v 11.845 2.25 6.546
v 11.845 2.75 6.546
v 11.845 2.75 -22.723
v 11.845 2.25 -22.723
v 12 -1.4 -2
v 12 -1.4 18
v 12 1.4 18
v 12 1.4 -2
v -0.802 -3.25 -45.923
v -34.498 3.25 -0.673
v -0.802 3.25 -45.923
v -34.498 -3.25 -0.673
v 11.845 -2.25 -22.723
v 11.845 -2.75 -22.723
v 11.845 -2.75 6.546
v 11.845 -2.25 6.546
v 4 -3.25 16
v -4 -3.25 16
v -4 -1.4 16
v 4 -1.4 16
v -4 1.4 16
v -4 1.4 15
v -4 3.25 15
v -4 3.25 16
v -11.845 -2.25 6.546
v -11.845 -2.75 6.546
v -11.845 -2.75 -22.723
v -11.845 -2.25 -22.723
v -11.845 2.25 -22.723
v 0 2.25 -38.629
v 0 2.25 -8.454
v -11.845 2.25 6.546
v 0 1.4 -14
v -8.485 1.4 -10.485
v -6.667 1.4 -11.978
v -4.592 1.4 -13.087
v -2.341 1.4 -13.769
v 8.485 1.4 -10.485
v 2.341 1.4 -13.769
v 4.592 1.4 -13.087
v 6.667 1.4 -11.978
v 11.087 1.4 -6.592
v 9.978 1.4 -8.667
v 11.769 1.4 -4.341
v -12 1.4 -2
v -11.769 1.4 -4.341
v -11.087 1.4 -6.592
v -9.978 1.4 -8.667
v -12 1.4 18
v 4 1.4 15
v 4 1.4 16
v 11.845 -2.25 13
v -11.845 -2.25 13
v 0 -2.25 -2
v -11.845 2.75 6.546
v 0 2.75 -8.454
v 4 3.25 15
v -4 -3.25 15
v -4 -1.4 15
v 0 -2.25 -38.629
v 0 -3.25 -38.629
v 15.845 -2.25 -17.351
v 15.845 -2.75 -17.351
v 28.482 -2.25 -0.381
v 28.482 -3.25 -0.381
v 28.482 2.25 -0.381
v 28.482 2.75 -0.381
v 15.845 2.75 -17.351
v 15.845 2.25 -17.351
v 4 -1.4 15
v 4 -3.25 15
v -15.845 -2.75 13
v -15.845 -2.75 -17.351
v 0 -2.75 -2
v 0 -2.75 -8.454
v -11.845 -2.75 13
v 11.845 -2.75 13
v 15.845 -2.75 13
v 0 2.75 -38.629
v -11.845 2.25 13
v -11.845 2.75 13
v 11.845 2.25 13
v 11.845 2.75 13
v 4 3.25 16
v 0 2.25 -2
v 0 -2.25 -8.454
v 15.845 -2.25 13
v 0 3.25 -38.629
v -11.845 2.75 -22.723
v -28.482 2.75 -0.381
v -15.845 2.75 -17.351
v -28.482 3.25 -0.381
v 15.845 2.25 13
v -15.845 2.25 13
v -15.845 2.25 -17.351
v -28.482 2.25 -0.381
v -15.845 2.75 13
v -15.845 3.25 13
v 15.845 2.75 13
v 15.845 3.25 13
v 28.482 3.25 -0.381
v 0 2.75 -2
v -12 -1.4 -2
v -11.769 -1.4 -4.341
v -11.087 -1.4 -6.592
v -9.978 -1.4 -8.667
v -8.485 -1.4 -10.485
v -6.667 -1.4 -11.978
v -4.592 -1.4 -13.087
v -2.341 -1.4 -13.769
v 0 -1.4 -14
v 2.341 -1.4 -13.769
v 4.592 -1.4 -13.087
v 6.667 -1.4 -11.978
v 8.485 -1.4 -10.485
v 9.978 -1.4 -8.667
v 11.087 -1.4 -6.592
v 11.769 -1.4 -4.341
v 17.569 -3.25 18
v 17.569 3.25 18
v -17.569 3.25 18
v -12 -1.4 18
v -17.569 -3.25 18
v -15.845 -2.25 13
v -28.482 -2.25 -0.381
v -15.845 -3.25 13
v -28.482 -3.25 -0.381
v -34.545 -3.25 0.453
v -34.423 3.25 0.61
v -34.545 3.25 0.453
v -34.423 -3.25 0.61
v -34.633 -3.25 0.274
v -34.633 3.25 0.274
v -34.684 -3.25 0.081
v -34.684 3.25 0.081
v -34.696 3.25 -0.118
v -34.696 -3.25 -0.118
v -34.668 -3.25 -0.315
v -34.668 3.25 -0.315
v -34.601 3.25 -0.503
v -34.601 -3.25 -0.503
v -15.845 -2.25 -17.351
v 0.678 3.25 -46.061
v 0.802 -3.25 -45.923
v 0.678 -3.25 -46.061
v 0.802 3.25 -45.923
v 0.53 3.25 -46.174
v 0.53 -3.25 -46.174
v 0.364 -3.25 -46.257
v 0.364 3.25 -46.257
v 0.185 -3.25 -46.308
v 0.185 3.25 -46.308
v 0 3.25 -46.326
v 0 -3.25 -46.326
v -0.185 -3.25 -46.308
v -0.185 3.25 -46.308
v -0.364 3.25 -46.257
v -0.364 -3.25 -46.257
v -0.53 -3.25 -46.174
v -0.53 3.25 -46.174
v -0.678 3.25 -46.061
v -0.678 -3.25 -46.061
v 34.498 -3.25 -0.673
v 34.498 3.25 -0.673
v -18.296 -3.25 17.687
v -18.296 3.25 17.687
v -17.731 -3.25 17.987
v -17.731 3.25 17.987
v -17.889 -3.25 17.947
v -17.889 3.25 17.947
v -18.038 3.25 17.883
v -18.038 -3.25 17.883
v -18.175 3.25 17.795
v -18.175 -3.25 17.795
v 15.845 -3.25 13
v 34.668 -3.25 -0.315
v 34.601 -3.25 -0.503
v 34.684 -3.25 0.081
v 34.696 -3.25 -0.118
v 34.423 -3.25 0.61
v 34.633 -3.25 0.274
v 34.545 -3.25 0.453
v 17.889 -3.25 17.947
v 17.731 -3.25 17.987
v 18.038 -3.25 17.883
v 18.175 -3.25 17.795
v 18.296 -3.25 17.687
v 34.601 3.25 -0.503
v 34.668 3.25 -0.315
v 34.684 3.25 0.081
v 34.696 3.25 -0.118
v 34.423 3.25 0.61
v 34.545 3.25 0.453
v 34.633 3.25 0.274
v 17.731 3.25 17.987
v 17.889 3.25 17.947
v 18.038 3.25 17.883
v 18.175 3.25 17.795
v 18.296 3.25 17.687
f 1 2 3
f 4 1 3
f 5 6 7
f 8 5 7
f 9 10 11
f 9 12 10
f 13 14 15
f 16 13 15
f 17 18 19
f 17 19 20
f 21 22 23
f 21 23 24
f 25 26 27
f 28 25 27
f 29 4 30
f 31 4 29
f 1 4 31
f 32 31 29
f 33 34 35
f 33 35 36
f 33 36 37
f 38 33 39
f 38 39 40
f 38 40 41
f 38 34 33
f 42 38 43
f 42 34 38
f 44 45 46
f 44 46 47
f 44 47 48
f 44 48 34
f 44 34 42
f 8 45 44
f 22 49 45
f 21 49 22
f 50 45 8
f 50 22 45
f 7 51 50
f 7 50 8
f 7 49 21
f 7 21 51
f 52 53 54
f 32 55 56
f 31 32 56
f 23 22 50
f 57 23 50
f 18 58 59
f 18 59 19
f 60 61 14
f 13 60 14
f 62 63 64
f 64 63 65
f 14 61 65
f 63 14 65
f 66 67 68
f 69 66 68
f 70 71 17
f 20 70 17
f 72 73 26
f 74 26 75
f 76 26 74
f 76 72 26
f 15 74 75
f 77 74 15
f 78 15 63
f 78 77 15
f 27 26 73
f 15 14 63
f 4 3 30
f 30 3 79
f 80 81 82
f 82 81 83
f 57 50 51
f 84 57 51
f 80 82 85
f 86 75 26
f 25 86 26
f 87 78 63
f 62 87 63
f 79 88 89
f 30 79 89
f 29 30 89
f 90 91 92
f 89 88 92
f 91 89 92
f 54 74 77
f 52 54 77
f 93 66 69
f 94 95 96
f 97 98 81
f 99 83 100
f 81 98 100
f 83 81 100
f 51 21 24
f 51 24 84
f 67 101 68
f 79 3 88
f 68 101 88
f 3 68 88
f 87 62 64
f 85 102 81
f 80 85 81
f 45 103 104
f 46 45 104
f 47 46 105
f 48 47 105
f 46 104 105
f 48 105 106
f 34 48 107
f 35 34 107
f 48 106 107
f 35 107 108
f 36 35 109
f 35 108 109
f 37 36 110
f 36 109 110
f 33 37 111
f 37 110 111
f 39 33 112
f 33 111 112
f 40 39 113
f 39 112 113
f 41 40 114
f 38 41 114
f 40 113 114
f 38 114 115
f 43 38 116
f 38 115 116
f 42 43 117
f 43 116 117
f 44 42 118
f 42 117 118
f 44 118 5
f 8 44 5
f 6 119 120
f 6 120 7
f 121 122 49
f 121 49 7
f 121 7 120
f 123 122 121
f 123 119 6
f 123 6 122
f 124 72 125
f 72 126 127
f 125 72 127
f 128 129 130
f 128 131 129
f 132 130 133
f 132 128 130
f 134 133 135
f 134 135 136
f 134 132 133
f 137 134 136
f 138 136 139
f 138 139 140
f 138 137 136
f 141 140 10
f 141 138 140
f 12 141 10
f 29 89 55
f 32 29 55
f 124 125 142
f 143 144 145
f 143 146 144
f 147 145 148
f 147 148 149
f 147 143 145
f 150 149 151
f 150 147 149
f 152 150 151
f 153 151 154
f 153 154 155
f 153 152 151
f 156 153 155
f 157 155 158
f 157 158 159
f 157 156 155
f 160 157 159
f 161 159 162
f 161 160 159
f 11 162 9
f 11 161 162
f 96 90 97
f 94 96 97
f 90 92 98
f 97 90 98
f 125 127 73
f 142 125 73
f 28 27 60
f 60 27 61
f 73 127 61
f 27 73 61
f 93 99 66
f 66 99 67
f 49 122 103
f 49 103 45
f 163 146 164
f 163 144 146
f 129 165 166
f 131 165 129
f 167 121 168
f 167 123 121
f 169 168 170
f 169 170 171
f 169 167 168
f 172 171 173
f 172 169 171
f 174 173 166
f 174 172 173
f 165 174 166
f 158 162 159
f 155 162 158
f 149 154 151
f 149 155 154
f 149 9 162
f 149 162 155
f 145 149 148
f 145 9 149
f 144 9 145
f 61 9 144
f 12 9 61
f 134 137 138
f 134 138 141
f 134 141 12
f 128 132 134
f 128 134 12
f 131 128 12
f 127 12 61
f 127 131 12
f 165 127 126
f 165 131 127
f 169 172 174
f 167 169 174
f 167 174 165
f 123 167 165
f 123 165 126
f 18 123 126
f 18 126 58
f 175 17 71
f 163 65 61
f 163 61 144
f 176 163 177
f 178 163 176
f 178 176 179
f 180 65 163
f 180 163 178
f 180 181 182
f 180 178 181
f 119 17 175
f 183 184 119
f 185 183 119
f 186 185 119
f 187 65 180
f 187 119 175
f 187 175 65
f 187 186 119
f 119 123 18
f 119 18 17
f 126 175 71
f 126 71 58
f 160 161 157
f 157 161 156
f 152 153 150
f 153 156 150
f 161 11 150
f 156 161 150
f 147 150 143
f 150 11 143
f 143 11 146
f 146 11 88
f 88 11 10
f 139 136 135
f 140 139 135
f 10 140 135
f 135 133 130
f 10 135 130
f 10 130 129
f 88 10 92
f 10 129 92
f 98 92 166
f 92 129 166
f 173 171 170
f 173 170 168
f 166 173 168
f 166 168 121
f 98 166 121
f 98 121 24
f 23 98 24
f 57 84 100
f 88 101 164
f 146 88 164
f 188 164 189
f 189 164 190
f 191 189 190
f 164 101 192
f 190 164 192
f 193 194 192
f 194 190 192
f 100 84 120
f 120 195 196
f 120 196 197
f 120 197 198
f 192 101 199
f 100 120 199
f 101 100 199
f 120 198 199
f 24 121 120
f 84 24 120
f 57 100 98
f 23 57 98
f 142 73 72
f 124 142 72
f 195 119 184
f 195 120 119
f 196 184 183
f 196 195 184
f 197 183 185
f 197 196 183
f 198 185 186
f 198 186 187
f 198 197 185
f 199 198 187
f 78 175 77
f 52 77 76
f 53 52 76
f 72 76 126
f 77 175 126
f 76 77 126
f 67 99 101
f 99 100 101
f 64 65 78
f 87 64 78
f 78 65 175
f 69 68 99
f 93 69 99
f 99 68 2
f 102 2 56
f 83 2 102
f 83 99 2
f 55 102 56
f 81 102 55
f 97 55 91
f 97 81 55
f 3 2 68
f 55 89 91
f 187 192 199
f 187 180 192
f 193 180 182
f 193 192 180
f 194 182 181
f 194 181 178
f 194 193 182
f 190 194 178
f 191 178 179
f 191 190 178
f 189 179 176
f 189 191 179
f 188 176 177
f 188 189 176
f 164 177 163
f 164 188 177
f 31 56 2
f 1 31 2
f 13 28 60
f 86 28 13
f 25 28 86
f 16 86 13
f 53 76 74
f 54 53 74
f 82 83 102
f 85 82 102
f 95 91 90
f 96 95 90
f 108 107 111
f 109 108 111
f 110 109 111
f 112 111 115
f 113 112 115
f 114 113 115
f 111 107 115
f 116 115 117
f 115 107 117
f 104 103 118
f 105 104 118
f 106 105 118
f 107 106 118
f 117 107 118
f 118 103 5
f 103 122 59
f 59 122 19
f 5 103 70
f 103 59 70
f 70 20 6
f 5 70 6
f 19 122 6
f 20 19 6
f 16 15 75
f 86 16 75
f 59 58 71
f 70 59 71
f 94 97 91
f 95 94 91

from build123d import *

# Parameters (mm, degrees)
F1_DEPTH  = 3.25
F3_DEPTH  = 0.5
F5_DEPTH  = 0.5
F7_DEPTH  = 0.5
F9_DEPTH  = 0.5
F10_W     = 24
F10_H     = 2.8
F11_DEPTH = 20
F13_DEPTH = 1.4
F14_W     = 8
F14_H     = 1
F15_DEPTH = 25
F16_R     = 1


# Not quite as in the source:
# - ends of sketch curves that miss each other by under 0.0002 mm in the source are joined


with BuildPart() as f1:
    # F0 (on Front) → F1 (new body, symmetric)
    with BuildSketch(Plane.XZ):
        Polygon((18, 18), (0, 18), (-18, 18), (-35, 0), (0, -47), (35, 0), align=None)
    extrude(amount=F1_DEPTH, both=True)

    # F2 (on face) → F3 (cut)
    with BuildSketch(Plane.XZ.offset(3.25)):
        Polygon((15.8447675538, 13), (-15.8447675538, 13), (-28.4822773709, -0.3808927475), (1.162e-07, -38.628522516), (28.4822775009, -0.3808928851), align=None)
    extrude(amount=-F3_DEPTH, mode=Mode.SUBTRACT)

    # F4 (on face) → F5 (cut)
    with BuildSketch(Plane(origin=(0, 3.25, 0), x_dir=(-1, 0, 0), z_dir=(0, 1, 0))):
        Polygon((28.482277527, -0.3808925379), (15.8447676545, 13.0000002682), (-15.8447670441, 13.0000002682), (-28.4822772579, -0.3808928993), (0, -38.6285223599), align=None)
    extrude(amount=-F5_DEPTH, mode=Mode.SUBTRACT)

    # F6 (on face) → F7 (cut)
    with BuildSketch(Plane.XZ.offset(2.75)):
        Polygon((-15.8447675538, -17.3512630734), (-15.8447675538, 13), (-28.4822773709, -0.3808927475), align=None)
        Polygon((28.4822775009, -0.3808928851), (15.8447675538, 13), (15.8447675538, -17.3512633855), align=None)
        Polygon((0, -8.4544227059), (-11.8447675538, 6.5455772941), (-11.8447675538, -22.7226916448), (1.162e-07, -38.628522516), (11.8447675538, -22.7226919569), (11.8447675538, 6.5455772941), align=None)
        Polygon((11.8447675538, 13), (-11.8447675538, 13), (0, -2), align=None)
    extrude(amount=-F7_DEPTH, mode=Mode.SUBTRACT)

    # F8 (on face) → F9 (cut)
    with BuildSketch(Plane(origin=(0, 2.75, 0), x_dir=(-1, 0, 0), z_dir=(0, 1, 0))):
        Polygon((-15.8447675538, -17.3512633855), (-15.8447675538, 13), (-28.4822772579, -0.3808928993), align=None)
        Polygon((0, -8.4544227059), (-11.8447675538, 6.5455772941), (-11.8447675538, -22.7226919569), (0, -38.6285223599), (11.8447675538, -22.7226916448), (11.8447675538, 6.5455772941), align=None)
        Polygon((-11.8447675538, 13), (0, -2), (11.8447675538, 13), align=None)
        Polygon((28.482277527, -0.3808925379), (15.8447676545, 13.0000002682), (15.8447675538, -17.3512630734), align=None)
    extrude(amount=-F9_DEPTH, mode=Mode.SUBTRACT)

    # F10 (on face) → F11 (cut)
    with BuildSketch(Plane.XY.offset(18)):
        Rectangle(F10_W, F10_H)
    extrude(amount=-F11_DEPTH, mode=Mode.SUBTRACT)

    # F12 (on Front) → F13 (cut, symmetric)
    with BuildSketch(Plane.XZ):
        with BuildLine():
            Line((12, -2), (-12, -2))
            ThreePointArc((-12, -2), (0, -14), (12, -2))
        make_face()
    extrude(amount=F13_DEPTH, both=True, mode=Mode.SUBTRACT)

    # F14 (on face) → F15 (cut)
    with BuildSketch(Plane.XZ.offset(3.25)):
        with Locations((0, 15.5)):
            Rectangle(F14_W, F14_H)
    extrude(amount=-F15_DEPTH, mode=Mode.SUBTRACT)

    # F16
    f16_edges = [f1.edges().sort_by_distance(p)[0] for p in [
        (0, 0, -47),
        (35, 0, 0),
        (-35, 0, 0),
        (-18, 0, 18),
        (18, 0, 18),
    ]]
    fillet(f16_edges, radius=F16_R)


solid = f1.part
